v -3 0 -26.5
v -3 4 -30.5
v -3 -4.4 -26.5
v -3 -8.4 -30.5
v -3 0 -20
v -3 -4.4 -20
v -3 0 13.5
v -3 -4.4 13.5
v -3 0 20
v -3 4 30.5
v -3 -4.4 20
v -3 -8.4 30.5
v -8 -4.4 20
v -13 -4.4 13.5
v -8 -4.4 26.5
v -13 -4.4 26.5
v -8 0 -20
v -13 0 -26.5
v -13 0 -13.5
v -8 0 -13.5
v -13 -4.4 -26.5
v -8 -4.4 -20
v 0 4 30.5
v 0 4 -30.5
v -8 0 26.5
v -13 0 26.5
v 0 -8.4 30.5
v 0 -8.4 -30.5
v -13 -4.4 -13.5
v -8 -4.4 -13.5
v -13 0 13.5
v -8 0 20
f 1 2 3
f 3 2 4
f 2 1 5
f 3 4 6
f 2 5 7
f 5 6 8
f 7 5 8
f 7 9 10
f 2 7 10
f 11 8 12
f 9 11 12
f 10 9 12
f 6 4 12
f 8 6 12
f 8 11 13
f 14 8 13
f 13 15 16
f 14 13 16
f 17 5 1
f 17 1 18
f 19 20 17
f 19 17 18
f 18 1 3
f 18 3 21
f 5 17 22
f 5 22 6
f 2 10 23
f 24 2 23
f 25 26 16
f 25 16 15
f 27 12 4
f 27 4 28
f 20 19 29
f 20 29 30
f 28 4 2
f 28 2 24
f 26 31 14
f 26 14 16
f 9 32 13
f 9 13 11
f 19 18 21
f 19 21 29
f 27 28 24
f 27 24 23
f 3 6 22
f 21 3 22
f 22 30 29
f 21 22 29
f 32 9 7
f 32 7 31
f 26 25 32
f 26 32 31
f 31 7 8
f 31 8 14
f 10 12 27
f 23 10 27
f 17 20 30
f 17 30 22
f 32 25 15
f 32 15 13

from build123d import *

# Parameters (mm, degrees)
PAD_DEPTH         = 4.4
SKETCH001_W       = 3
SKETCH001_H       = 61
PAD001_DEPTH      = 4
PAD001_DEPTH_BACK = 8.4


with BuildPart() as part:
    # Sketch → Pad (new body)
    with BuildSketch(Plane.XZ):
        Polygon((-3, -30.5), (-3, -26.5), (-13, -26.5), (-13, -13.5), (-8, -13.5), (-8, -20), (-3, -20), (-3, 13.5), (-13, 13.5), (-13, 26.5), (-8, 26.5), (-8, 20), (-3, 20), (-3, 30.5), (0, 30.5), (0, -30.5), align=None)
    extrude(amount=PAD_DEPTH)

    # Sketch001 (on Face18 of Pad) → Pad001 (join, two sides)
    with BuildSketch(Plane.XZ.offset(4.4)) as pad001_sk:
        with Locations((-1.5, 0)):
            Rectangle(SKETCH001_W, SKETCH001_H)
    extrude(amount=PAD001_DEPTH)
    extrude(pad001_sk.sketch, amount=-PAD001_DEPTH_BACK)


solid = part.part
